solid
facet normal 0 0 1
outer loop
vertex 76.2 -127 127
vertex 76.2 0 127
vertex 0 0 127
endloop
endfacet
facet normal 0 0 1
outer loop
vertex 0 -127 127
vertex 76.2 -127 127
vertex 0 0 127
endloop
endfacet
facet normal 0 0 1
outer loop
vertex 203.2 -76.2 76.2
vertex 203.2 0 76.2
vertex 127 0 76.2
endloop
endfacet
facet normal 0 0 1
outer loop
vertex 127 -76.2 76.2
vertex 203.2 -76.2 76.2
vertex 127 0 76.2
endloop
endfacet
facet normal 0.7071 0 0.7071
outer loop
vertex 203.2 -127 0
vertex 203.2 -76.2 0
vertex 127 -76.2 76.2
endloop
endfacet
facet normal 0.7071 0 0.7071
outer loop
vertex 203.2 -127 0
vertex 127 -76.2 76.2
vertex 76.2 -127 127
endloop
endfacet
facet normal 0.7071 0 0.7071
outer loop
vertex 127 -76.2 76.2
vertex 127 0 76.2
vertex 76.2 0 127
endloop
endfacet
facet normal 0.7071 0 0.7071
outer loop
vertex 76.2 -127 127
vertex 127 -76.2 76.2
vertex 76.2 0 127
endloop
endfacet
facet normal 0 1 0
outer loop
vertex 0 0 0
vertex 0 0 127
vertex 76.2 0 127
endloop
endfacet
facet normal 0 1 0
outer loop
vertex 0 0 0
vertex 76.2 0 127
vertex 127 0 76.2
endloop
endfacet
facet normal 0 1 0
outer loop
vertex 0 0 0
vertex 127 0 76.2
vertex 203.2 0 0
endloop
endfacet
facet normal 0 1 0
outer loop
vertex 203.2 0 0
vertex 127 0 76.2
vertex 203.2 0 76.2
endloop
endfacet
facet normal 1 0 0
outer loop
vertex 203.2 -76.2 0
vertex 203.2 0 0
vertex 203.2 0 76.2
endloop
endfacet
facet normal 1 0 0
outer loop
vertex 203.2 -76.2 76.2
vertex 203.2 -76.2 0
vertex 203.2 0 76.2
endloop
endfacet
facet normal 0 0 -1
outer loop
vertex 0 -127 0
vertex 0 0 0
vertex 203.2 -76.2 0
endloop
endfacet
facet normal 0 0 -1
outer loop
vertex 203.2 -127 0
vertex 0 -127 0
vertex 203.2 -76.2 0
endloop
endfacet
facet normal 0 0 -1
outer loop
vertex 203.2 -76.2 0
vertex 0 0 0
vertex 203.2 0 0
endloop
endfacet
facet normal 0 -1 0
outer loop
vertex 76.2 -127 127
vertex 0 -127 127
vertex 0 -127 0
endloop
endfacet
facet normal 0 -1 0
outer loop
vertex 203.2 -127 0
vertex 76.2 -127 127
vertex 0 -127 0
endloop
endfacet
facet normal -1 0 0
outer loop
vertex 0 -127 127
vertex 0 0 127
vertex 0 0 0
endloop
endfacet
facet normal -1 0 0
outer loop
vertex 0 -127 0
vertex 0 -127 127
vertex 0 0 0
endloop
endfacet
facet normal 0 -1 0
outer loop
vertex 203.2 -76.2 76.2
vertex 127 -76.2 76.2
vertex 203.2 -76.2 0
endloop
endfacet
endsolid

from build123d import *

# Parameters (mm, degrees)
F1_DEPTH = 127
F2_DEPTH = 76.2


with BuildPart() as f1:
    # F0 (on Front) → F1 (new body)
    with BuildSketch(Plane.XZ):
        Polygon((0, 127), (0, 0), (203.2, 0), (127, 76.2), (76.2, 127), align=None)
    extrude(amount=F1_DEPTH)

    # F0 (on Front) → F2 (join)
    with BuildSketch(Plane.XZ):
        Polygon((127, 76.2), (203.2, 0), (203.2, 76.2), align=None)
    extrude(amount=F2_DEPTH)


solid = f1.part
